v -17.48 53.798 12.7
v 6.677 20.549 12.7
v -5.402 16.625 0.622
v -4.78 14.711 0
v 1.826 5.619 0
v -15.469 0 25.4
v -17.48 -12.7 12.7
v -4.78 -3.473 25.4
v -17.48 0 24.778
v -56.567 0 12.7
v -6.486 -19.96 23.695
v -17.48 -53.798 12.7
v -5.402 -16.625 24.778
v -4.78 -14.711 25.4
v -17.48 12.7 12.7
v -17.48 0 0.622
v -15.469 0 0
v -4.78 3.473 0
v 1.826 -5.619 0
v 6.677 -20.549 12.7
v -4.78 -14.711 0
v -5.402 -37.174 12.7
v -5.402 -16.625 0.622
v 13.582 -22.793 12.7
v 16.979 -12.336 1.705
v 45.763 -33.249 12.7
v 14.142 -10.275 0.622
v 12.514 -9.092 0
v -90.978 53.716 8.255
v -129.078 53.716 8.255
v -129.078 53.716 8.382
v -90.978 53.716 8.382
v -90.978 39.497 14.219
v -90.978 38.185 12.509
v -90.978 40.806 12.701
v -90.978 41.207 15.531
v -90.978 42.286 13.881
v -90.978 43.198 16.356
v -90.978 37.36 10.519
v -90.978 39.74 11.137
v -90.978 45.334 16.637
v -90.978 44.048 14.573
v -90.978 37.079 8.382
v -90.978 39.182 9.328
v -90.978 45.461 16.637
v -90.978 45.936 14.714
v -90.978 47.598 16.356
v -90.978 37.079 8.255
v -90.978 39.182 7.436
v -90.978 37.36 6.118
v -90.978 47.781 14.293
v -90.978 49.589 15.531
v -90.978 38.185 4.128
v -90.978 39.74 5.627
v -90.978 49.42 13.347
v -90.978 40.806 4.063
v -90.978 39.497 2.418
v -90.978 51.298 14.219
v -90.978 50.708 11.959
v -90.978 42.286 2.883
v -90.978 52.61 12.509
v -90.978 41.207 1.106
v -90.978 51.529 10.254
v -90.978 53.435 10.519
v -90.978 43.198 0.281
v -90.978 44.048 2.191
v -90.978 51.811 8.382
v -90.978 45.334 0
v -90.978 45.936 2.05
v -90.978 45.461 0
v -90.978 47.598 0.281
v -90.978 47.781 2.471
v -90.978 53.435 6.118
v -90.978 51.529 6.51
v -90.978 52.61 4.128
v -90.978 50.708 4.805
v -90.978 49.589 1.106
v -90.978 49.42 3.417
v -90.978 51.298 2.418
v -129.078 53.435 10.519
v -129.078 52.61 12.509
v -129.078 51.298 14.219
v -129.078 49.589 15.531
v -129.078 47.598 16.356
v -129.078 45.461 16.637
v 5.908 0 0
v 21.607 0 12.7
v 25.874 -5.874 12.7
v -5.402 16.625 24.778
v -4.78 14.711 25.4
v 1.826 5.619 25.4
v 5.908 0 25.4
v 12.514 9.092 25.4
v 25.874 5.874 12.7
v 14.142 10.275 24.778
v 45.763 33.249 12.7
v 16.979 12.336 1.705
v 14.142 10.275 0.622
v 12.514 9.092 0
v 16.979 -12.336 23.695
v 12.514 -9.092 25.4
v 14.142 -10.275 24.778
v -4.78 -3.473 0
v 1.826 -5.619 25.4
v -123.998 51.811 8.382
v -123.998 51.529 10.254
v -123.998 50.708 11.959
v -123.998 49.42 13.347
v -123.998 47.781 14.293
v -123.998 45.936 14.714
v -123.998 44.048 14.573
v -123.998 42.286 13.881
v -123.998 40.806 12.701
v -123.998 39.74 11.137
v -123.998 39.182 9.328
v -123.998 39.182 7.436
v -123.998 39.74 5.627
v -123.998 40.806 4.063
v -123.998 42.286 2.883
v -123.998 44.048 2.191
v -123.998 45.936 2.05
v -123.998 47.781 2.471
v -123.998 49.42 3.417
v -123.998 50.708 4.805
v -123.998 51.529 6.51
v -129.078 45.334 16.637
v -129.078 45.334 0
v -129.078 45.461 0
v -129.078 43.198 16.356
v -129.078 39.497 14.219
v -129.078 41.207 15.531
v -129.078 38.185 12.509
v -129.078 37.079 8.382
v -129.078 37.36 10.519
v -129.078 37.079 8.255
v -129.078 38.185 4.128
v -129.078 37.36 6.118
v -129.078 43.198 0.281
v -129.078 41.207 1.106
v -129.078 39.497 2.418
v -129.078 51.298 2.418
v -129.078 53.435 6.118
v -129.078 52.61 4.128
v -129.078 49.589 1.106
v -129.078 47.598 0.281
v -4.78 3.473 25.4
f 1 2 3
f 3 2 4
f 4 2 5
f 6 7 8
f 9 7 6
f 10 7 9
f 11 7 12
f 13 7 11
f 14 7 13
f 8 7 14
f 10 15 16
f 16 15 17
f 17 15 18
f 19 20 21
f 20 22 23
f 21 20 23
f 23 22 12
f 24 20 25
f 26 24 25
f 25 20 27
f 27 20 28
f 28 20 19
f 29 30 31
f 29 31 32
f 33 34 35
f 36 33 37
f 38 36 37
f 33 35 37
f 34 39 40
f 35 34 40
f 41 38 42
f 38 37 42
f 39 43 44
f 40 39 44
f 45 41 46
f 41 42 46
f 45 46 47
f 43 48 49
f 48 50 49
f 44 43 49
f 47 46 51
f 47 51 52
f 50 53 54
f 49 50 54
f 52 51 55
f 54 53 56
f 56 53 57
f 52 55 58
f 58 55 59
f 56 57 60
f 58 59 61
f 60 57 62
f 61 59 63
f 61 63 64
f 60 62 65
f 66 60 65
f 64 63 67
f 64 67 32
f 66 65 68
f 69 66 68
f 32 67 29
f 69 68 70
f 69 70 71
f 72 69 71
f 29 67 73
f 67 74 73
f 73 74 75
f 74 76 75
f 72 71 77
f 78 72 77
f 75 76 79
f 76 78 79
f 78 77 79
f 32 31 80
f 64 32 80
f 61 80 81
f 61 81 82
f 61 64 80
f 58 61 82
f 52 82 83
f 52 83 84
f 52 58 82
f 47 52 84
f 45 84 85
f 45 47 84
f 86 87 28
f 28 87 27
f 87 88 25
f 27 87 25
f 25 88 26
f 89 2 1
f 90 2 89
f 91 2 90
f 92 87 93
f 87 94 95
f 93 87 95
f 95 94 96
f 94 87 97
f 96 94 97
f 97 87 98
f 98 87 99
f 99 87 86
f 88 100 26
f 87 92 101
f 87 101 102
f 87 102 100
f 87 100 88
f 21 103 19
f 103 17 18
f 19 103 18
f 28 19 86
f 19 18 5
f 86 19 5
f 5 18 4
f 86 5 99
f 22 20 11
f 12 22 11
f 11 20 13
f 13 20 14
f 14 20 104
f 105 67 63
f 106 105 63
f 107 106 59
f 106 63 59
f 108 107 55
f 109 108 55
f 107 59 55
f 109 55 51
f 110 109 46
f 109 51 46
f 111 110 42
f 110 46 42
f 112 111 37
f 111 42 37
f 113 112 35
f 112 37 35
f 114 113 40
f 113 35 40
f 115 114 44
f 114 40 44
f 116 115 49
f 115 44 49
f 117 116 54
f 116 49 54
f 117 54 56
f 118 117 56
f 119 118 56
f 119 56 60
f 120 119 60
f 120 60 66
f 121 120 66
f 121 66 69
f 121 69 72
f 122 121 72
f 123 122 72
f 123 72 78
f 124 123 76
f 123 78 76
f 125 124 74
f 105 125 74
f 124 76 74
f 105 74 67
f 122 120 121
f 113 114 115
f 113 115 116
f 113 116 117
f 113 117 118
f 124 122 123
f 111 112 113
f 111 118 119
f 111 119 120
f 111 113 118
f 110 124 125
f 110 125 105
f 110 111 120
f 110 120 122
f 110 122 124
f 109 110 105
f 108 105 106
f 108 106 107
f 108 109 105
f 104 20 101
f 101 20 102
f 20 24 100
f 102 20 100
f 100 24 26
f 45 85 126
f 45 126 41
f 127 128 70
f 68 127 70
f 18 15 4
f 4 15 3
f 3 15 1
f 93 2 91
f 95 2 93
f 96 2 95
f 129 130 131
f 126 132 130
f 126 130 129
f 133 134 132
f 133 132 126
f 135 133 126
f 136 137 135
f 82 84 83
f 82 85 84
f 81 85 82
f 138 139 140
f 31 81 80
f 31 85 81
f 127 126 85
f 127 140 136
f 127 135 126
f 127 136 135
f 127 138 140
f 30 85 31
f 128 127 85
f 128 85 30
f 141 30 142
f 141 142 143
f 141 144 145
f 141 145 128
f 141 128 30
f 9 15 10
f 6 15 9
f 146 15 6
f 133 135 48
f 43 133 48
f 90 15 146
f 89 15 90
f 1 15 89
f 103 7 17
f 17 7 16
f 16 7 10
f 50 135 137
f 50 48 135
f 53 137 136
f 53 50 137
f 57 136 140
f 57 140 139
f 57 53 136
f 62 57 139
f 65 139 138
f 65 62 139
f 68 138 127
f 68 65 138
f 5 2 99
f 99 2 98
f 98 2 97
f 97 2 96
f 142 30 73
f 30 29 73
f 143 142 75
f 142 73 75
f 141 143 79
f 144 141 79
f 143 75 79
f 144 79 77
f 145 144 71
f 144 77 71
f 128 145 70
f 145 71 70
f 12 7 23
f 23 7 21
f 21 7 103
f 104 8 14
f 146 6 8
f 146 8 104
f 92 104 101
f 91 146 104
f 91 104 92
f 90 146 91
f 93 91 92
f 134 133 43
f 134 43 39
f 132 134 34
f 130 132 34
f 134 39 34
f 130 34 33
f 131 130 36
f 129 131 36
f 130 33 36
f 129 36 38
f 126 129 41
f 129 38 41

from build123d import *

# Parameters (mm, degrees)
F1_DEPTH      = 25.4
F2_T4_DEPTH   = 106.4188112086
F2_T9_DEPTH   = 106.4188112086
F2_T14_DEPTH  = 106.4188112086
F2_T19_DEPTH  = 106.4188112086
F2_T24_DEPTH  = 106.4188112086
F2_T29_DEPTH  = 106.4188112086
F2_T34_DEPTH  = 106.4188112086
F2_T39_DEPTH  = 106.4188112086
F2_T44_DEPTH  = 106.4188112086
F2_T49_DEPTH  = 106.4188112086
F2_T54_DEPTH  = 106.4188112086
F2_T59_DEPTH  = 106.4188112086
F2_T64_DEPTH  = 106.4188112086
F2_T69_DEPTH  = 106.4188112086
F2_T74_DEPTH  = 106.4188112086
F2_T79_DEPTH  = 106.4188112086
F2_T84_DEPTH  = 106.4188112086
F2_T89_DEPTH  = 106.4188112086
F2_T94_DEPTH  = 106.4188112086
F2_T99_DEPTH  = 106.4188112086
F2_T104_DEPTH = 106.4188112086
F2_T109_DEPTH = 106.4188112086
F2_T114_DEPTH = 106.4188112086
F2_T119_DEPTH = 106.4188112086
F2_T124_DEPTH = 106.4188112086
F2_T129_DEPTH = 106.4188112086
F2_T134_DEPTH = 106.4188112086
F2_T139_DEPTH = 106.4188112086
F2_T144_DEPTH = 106.4188112086
F2_T149_DEPTH = 106.4188112086
F2_T154_DEPTH = 106.4188112086
F2_T159_DEPTH = 106.4188112086
F2_T164_DEPTH = 106.4188112086
F2_T169_DEPTH = 106.4188112086
F2_T174_DEPTH = 106.4188112086
F2_T179_DEPTH = 106.4188112086
F2_T184_DEPTH = 106.4188112086
F2_T189_DEPTH = 106.4188112086
F2_T194_DEPTH = 106.4188112086
F2_T199_DEPTH = 106.4188112086
F2_T205_DEPTH = 106.4188112086
F2_T210_DEPTH = 106.4188112086
F2_T218_DEPTH = 106.4188112086
F2_T223_DEPTH = 106.4188112086
F2_T231_DEPTH = 106.4188112086
F2_T236_DEPTH = 106.4188112086
F2_T244_DEPTH = 106.4188112086
F2_T249_DEPTH = 106.4188112086
F2_T257_DEPTH = 106.4188112086
F2_T262_DEPTH = 106.4188112086
F2_T270_DEPTH = 106.4188112086
F2_T275_DEPTH = 106.4188112086
F2_T283_DEPTH = 106.4188112086
F2_T288_DEPTH = 106.4188112086
F2_T296_DEPTH = 106.4188112086
F2_T301_DEPTH = 106.4188112086
F2_T309_DEPTH = 106.4188112086
F2_T314_DEPTH = 106.4188112086
F2_T322_DEPTH = 106.4188112086
F2_T327_DEPTH = 106.4188112086
F3_W          = 38.1
F3_H          = 16.637
F4_DEPTH      = 16.637
F5_R          = 8.255
F6_R          = 6.35
F7_DEPTH      = 33.02


# Not quite as in the source:
# - a fillet or chamfer that OpenCascade refuses, or shapes differently, is made with other operations: its cross-section is extruded or revolved along the edge and cut away or added


with BuildPart() as f1:
    # F0 (on Top) → F1 (new body)
    with BuildSketch(Plane.XY):
        Polygon((45.763366046, 33.2490316571), (6.6767851239, 20.5490316571), (-17.48005039, 53.7980633142), (-17.48005039, 12.7), (-56.5666313121, 0), (-17.48005039, -12.7), (-17.48005039, -53.7980633142), (-5.401632633, -37.1735474857), (6.6767851239, -20.5490316571), (26.220075585, -26.8990316571), (45.763366046, -33.2490316571), (33.6849482891, -16.6245158286), (27.6457394106, -8.3122579143), (21.6065305321, 0), (27.6457394106, 8.3122579143), (33.6849482891, 16.6245158286), align=None)
    extrude(amount=F1_DEPTH)

    # F2: chamfer of 12.7 on 20 edges, made by hand


with BuildPart() as f2_tool2:
    # F2_s3 → F2_t4 (new body)
    with BuildSketch(Plane(origin=(82.2268601462, 26.7171264209, 0), x_dir=(0, 0, 1), z_dir=(-0.9510565163, -0.3090169944, 0))):
        Polygon((12.7, 17.48005039), (0, 4.78005039), (0, 17.48005039), align=None)
    extrude(amount=F2_T4_DEPTH)

    split(bisect_by=Plane(origin=(14.141657828, 10.2745158286, 0), x_dir=(0, 0, 1), z_dir=(0.8090169944, 0.5877852523, 0)), keep=Keep.TOP)


with BuildPart() as f1_1:
    add(f1.part)

    # F2_t1: cut F2_tool2
    add(f2_tool2.part, mode=Mode.SUBTRACT)


with BuildPart() as f2_tool7:
    # F2_s8 → F2_t9 (new body)
    with BuildSketch(Plane(origin=(82.2268601462, 26.7171264209, 0), x_dir=(0, 0, 1), z_dir=(-0.9510565163, -0.3090169944, 0))):
        Polygon((12.7, 17.48005039), (0, 4.78005039), (0, 17.48005039), align=None)
    extrude(amount=F2_T9_DEPTH)

    split(bisect_by=Plane.YZ.offset(-17.48005039), keep=Keep.BOTTOM)


with BuildPart() as f1_2:
    add(f1_1.part)

    # F2_t6: cut F2_tool7
    add(f2_tool7.part, mode=Mode.SUBTRACT)


with BuildPart() as f2_tool12:
    # F2_s13 → F2_t14 (new body)
    with BuildSketch(Plane(origin=(11.7324134364, -16.1482817373, 0), x_dir=(0, 0, 1), z_dir=(-0.5877852523, 0.8090169944, 0))):
        Polygon((12.7, 17.48005039), (0, 4.78005039), (0, 17.48005039), align=None)
    extrude(amount=F2_T14_DEPTH)

    split(bisect_by=Plane(origin=(14.141657828, -10.2745158286, 0), x_dir=(0, 0, 1), z_dir=(0.8090169944, -0.5877852523, 0)), keep=Keep.TOP)


with BuildPart() as f1_3:
    add(f1_2.part)

    # F2_t11: cut F2_tool12
    add(f2_tool12.part, mode=Mode.SUBTRACT)


with BuildPart() as f2_tool17:
    # F2_s18 → F2_t19 (new body)
    with BuildSketch(Plane(origin=(11.7324134364, -16.1482817373, 0), x_dir=(0, 0, 1), z_dir=(-0.5877852523, 0.8090169944, 0))):
        Polygon((12.7, 17.48005039), (0, 4.78005039), (0, 17.48005039), align=None)
    extrude(amount=F2_T19_DEPTH)

    split(bisect_by=Plane(origin=(-5.401632633, 16.6245158286, 0), x_dir=(0, 0, 1), z_dir=(-0.3090169944, 0.9510565163, 0)), keep=Keep.TOP)


with BuildPart() as f1_4:
    add(f1_3.part)

    # F2_t16: cut F2_tool17
    add(f2_tool17.part, mode=Mode.SUBTRACT)


with BuildPart() as f2_tool22:
    # F2_s23 → F2_t24 (new body)
    with BuildSketch(Plane.XZ.offset(-86.4584372614)):
        Polygon((-17.48005039, 12.7), (-4.78005039, 0), (-17.48005039, 0), align=None)
    extrude(amount=F2_T24_DEPTH)

    split(bisect_by=Plane(origin=(-5.401632633, 16.6245158286, 0), x_dir=(0, 0, 1), z_dir=(-0.3090169944, 0.9510565163, 0)), keep=Keep.TOP)


with BuildPart() as f1_5:
    add(f1_4.part)

    # F2_t21: cut F2_tool22
    add(f2_tool22.part, mode=Mode.SUBTRACT)


with BuildPart() as f2_tool27:
    # F2_s28 → F2_t29 (new body)
    with BuildSketch(Plane.XZ.offset(-86.4584372614)):
        Polygon((-17.48005039, 12.7), (-4.78005039, 0), (-17.48005039, 0), align=None)
    extrude(amount=F2_T29_DEPTH)

    split(bisect_by=Plane(origin=(-5.401632633, -16.6245158286, 0), x_dir=(0, 0, 1), z_dir=(-0.3090169944, -0.9510565163, 0)), keep=Keep.TOP)


with BuildPart() as f1_6:
    add(f1_5.part)

    # F2_t26: cut F2_tool27
    add(f2_tool27.part, mode=Mode.SUBTRACT)


with BuildPart() as f2_tool32:
    # F2_s33 → F2_t34 (new body)
    with BuildSketch(Plane(origin=(18.9834437101, 6.1680947638, 0), x_dir=(0, 0, 1), z_dir=(-0.9510565163, -0.3090169944, 0))):
        Polygon((12.7, 17.48005039), (0, 4.78005039), (0, 17.48005039), align=None)
    extrude(amount=F2_T34_DEPTH)

    split(bisect_by=Plane(origin=(14.141657828, 10.2745158286, 0), x_dir=(0, 0, 1), z_dir=(0.8090169944, 0.5877852523, 0)), keep=Keep.TOP)


with BuildPart() as f1_7:
    add(f1_6.part)

    # F2_t31: cut F2_tool32
    add(f2_tool32.part, mode=Mode.SUBTRACT)


with BuildPart() as f2_tool37:
    # F2_s38 → F2_t39 (new body)
    with BuildSketch(Plane(origin=(18.9834437101, 6.1680947638, 0), x_dir=(0, 0, 1), z_dir=(-0.9510565163, -0.3090169944, 0))):
        Polygon((12.7, 17.48005039), (0, 4.78005039), (0, 17.48005039), align=None)
    extrude(amount=F2_T39_DEPTH)

    split(bisect_by=Plane.YZ.offset(-17.48005039), keep=Keep.BOTTOM)


with BuildPart() as f1_8:
    add(f1_7.part)

    # F2_t36: cut F2_tool37
    add(f2_tool37.part, mode=Mode.SUBTRACT)


with BuildPart() as f2_tool42:
    # F2_s43 → F2_t44 (new body)
    with BuildSketch(Plane(origin=(-82.2268601462, 26.7171264209, 0), x_dir=(0, 0, 1), z_dir=(0.9510565163, -0.3090169944, 0))):
        Polygon((12.7, 17.48005039), (0, 4.78005039), (0, 17.48005039), align=None)
    extrude(amount=F2_T44_DEPTH)

    split(bisect_by=Plane.YZ.offset(-17.48005039), keep=Keep.BOTTOM)


with BuildPart() as f1_9:
    add(f1_8.part)

    # F2_t41: cut F2_tool42
    add(f2_tool42.part, mode=Mode.SUBTRACT)


with BuildPart() as f2_tool47:
    # F2_s48 → F2_t49 (new body)
    with BuildSketch(Plane(origin=(-82.2268601462, 26.7171264209, 0), x_dir=(0, 0, 1), z_dir=(0.9510565163, -0.3090169944, 0))):
        Polygon((12.7, 17.48005039), (0, 4.78005039), (0, 17.48005039), align=None)
    extrude(amount=F2_T49_DEPTH)

    split(bisect_by=Plane(origin=(14.141657828, -10.2745158286, 0), x_dir=(0, 0, 1), z_dir=(0.8090169944, -0.5877852523, 0)), keep=Keep.TOP)


with BuildPart() as f1_10:
    add(f1_9.part)

    # F2_t46: cut F2_tool47
    add(f2_tool47.part, mode=Mode.SUBTRACT)


with BuildPart() as f2_tool52:
    # F2_s53 → F2_t54 (new body)
    with BuildSketch(Plane.XZ.offset(-19.9603739472)):
        Polygon((-17.48005039, 12.7), (-4.78005039, 0), (-17.48005039, 0), align=None)
    extrude(amount=F2_T54_DEPTH)

    split(bisect_by=Plane(origin=(-5.401632633, 16.6245158286, 0), x_dir=(0, 0, 1), z_dir=(-0.3090169944, 0.9510565163, 0)), keep=Keep.TOP)


with BuildPart() as f1_11:
    add(f1_10.part)

    # F2_t51: cut F2_tool52
    add(f2_tool52.part, mode=Mode.SUBTRACT)


with BuildPart() as f2_tool57:
    # F2_s58 → F2_t59 (new body)
    with BuildSketch(Plane.XZ.offset(-19.9603739472)):
        Polygon((-17.48005039, 12.7), (-4.78005039, 0), (-17.48005039, 0), align=None)
    extrude(amount=F2_T59_DEPTH)

    split(bisect_by=Plane(origin=(-5.401632633, -16.6245158286, 0), x_dir=(0, 0, 1), z_dir=(-0.3090169944, -0.9510565163, 0)), keep=Keep.TOP)


with BuildPart() as f1_12:
    add(f1_11.part)

    # F2_t56: cut F2_tool57
    add(f2_tool57.part, mode=Mode.SUBTRACT)


with BuildPart() as f2_tool62:
    # F2_s63 → F2_t64 (new body)
    with BuildSketch(Plane(origin=(-50.8189943585, -69.9463450516, 0), x_dir=(0, 0, 1), z_dir=(0.5877852523, 0.8090169944, 0))):
        Polygon((12.7, 17.48005039), (0, 4.78005039), (0, 17.48005039), align=None)
    extrude(amount=F2_T64_DEPTH)

    split(bisect_by=Plane(origin=(-5.401632633, -16.6245158286, 0), x_dir=(0, 0, 1), z_dir=(-0.3090169944, -0.9510565163, 0)), keep=Keep.TOP)


with BuildPart() as f1_13:
    add(f1_12.part)

    # F2_t61: cut F2_tool62
    add(f2_tool62.part, mode=Mode.SUBTRACT)


with BuildPart() as f2_tool67:
    # F2_s68 → F2_t69 (new body)
    with BuildSketch(Plane(origin=(-50.8189943585, -69.9463450516, 0), x_dir=(0, 0, 1), z_dir=(0.5877852523, 0.8090169944, 0))):
        Polygon((12.7, 17.48005039), (0, 4.78005039), (0, 17.48005039), align=None)
    extrude(amount=F2_T69_DEPTH)

    split(bisect_by=Plane(origin=(14.141657828, 10.2745158286, 0), x_dir=(0, 0, 1), z_dir=(0.8090169944, 0.5877852523, 0)), keep=Keep.TOP)


with BuildPart() as f1_14:
    add(f1_13.part)

    # F2_t66: cut F2_tool67
    add(f2_tool67.part, mode=Mode.SUBTRACT)


with BuildPart() as f2_tool72:
    # F2_s73 → F2_t74 (new body)
    with BuildSketch(Plane(origin=(-18.9834437101, 6.1680947638, 0), x_dir=(0, 0, 1), z_dir=(0.9510565163, -0.3090169944, 0))):
        Polygon((12.7, 17.48005039), (0, 4.78005039), (0, 17.48005039), align=None)
    extrude(amount=F2_T74_DEPTH)

    split(bisect_by=Plane.YZ.offset(-17.48005039), keep=Keep.BOTTOM)


with BuildPart() as f1_15:
    add(f1_14.part)

    # F2_t71: cut F2_tool72
    add(f2_tool72.part, mode=Mode.SUBTRACT)


with BuildPart() as f2_tool77:
    # F2_s78 → F2_t79 (new body)
    with BuildSketch(Plane(origin=(-18.9834437101, 6.1680947638, 0), x_dir=(0, 0, 1), z_dir=(0.9510565163, -0.3090169944, 0))):
        Polygon((12.7, 17.48005039), (0, 4.78005039), (0, 17.48005039), align=None)
    extrude(amount=F2_T79_DEPTH)

    split(bisect_by=Plane(origin=(14.141657828, -10.2745158286, 0), x_dir=(0, 0, 1), z_dir=(0.8090169944, -0.5877852523, 0)), keep=Keep.TOP)


with BuildPart() as f1_16:
    add(f1_15.part)

    # F2_t76: cut F2_tool77
    add(f2_tool77.part, mode=Mode.SUBTRACT)


with BuildPart() as f2_tool82:
    # F2_s83 → F2_t84 (new body)
    with BuildSketch(Plane(origin=(50.8189943585, -69.9463450516, 0), x_dir=(0, 0, 1), z_dir=(-0.5877852523, 0.8090169944, 0))):
        Polygon((12.7, 17.48005039), (0, 4.78005039), (0, 17.48005039), align=None)
    extrude(amount=F2_T84_DEPTH)

    split(bisect_by=Plane(origin=(14.141657828, -10.2745158286, 0), x_dir=(0, 0, 1), z_dir=(0.8090169944, -0.5877852523, 0)), keep=Keep.TOP)


with BuildPart() as f1_17:
    add(f1_16.part)

    # F2_t81: cut F2_tool82
    add(f2_tool82.part, mode=Mode.SUBTRACT)


with BuildPart() as f2_tool87:
    # F2_s88 → F2_t89 (new body)
    with BuildSketch(Plane(origin=(50.8189943585, -69.9463450516, 0), x_dir=(0, 0, 1), z_dir=(-0.5877852523, 0.8090169944, 0))):
        Polygon((12.7, 17.48005039), (0, 4.78005039), (0, 17.48005039), align=None)
    extrude(amount=F2_T89_DEPTH)

    split(bisect_by=Plane(origin=(-5.401632633, 16.6245158286, 0), x_dir=(0, 0, 1), z_dir=(-0.3090169944, 0.9510565163, 0)), keep=Keep.TOP)


with BuildPart() as f1_18:
    add(f1_17.part)

    # F2_t86: cut F2_tool87
    add(f2_tool87.part, mode=Mode.SUBTRACT)


with BuildPart() as f2_tool92:
    # F2_s93 → F2_t94 (new body)
    with BuildSketch(Plane(origin=(-11.7324134364, -16.1482817373, 0), x_dir=(0, 0, 1), z_dir=(0.5877852523, 0.8090169944, 0))):
        Polygon((12.7, 17.48005039), (0, 4.78005039), (0, 17.48005039), align=None)
    extrude(amount=F2_T94_DEPTH)

    split(bisect_by=Plane(origin=(-5.401632633, -16.6245158286, 0), x_dir=(0, 0, 1), z_dir=(-0.3090169944, -0.9510565163, 0)), keep=Keep.TOP)


with BuildPart() as f1_19:
    add(f1_18.part)

    # F2_t91: cut F2_tool92
    add(f2_tool92.part, mode=Mode.SUBTRACT)


with BuildPart() as f2_tool97:
    # F2_s98 → F2_t99 (new body)
    with BuildSketch(Plane(origin=(-11.7324134364, -16.1482817373, 0), x_dir=(0, 0, 1), z_dir=(0.5877852523, 0.8090169944, 0))):
        Polygon((12.7, 17.48005039), (0, 4.78005039), (0, 17.48005039), align=None)
    extrude(amount=F2_T99_DEPTH)

    split(bisect_by=Plane(origin=(14.141657828, 10.2745158286, 0), x_dir=(0, 0, 1), z_dir=(0.8090169944, 0.5877852523, 0)), keep=Keep.TOP)


with BuildPart() as f1_20:
    add(f1_19.part)

    # F2_t96: cut F2_tool97
    add(f2_tool97.part, mode=Mode.SUBTRACT)


with BuildPart() as f2_tool102:
    # F2_s103 → F2_t104 (new body)
    with BuildSketch(Plane(origin=(50.8189943585, 69.9463450516, 0), x_dir=(0, 0, 1), z_dir=(-0.5877852523, -0.8090169944, 0))):
        Polygon((12.7, -17.48005039), (25.4, -4.78005039), (25.4, -17.48005039), align=None)
    extrude(amount=F2_T104_DEPTH)

    split(bisect_by=Plane(origin=(14.141657828, 10.2745158286, 0), x_dir=(0, 0, 1), z_dir=(0.8090169944, 0.5877852523, 0)), keep=Keep.TOP)


with BuildPart() as f1_21:
    add(f1_20.part)

    # F2_t101: cut F2_tool102
    add(f2_tool102.part, mode=Mode.SUBTRACT)


with BuildPart() as f2_tool107:
    # F2_s108 → F2_t109 (new body)
    with BuildSketch(Plane(origin=(50.8189943585, 69.9463450516, 0), x_dir=(0, 0, 1), z_dir=(-0.5877852523, -0.8090169944, 0))):
        Polygon((12.7, -17.48005039), (25.4, -4.78005039), (25.4, -17.48005039), align=None)
    extrude(amount=F2_T109_DEPTH)

    split(bisect_by=Plane(origin=(-5.401632633, -16.6245158286, 0), x_dir=(0, 0, 1), z_dir=(-0.3090169944, -0.9510565163, 0)), keep=Keep.TOP)


with BuildPart() as f1_22:
    add(f1_21.part)

    # F2_t106: cut F2_tool107
    add(f2_tool107.part, mode=Mode.SUBTRACT)


with BuildPart() as f2_tool112:
    # F2_s113 → F2_t114 (new body)
    with BuildSketch(Plane(origin=(82.2268601462, 26.7171264209, 0), x_dir=(0, 0, 1), z_dir=(-0.9510565163, -0.3090169944, 0))):
        Polygon((12.7, 17.48005039), (25.4, 4.78005039), (25.4, 17.48005039), align=None)
    extrude(amount=F2_T114_DEPTH)

    split(bisect_by=Plane(origin=(14.141657828, 10.2745158286, 0), x_dir=(0, 0, 1), z_dir=(0.8090169944, 0.5877852523, 0)), keep=Keep.TOP)


with BuildPart() as f1_23:
    add(f1_22.part)

    # F2_t111: cut F2_tool112
    add(f2_tool112.part, mode=Mode.SUBTRACT)


with BuildPart() as f2_tool117:
    # F2_s118 → F2_t119 (new body)
    with BuildSketch(Plane(origin=(82.2268601462, 26.7171264209, 0), x_dir=(0, 0, 1), z_dir=(-0.9510565163, -0.3090169944, 0))):
        Polygon((12.7, 17.48005039), (25.4, 4.78005039), (25.4, 17.48005039), align=None)
    extrude(amount=F2_T119_DEPTH)

    split(bisect_by=Plane.YZ.offset(-17.48005039), keep=Keep.BOTTOM)


with BuildPart() as f1_24:
    add(f1_23.part)

    # F2_t116: cut F2_tool117
    add(f2_tool117.part, mode=Mode.SUBTRACT)


with BuildPart() as f2_tool122:
    # F2_s123 → F2_t124 (new body)
    with BuildSketch(Plane(origin=(11.7324134364, -16.1482817373, 0), x_dir=(0, 0, 1), z_dir=(-0.5877852523, 0.8090169944, 0))):
        Polygon((12.7, 17.48005039), (25.4, 4.78005039), (25.4, 17.48005039), align=None)
    extrude(amount=F2_T124_DEPTH)

    split(bisect_by=Plane(origin=(14.141657828, -10.2745158286, 0), x_dir=(0, 0, 1), z_dir=(0.8090169944, -0.5877852523, 0)), keep=Keep.TOP)


with BuildPart() as f1_25:
    add(f1_24.part)

    # F2_t121: cut F2_tool122
    add(f2_tool122.part, mode=Mode.SUBTRACT)


with BuildPart() as f2_tool127:
    # F2_s128 → F2_t129 (new body)
    with BuildSketch(Plane(origin=(11.7324134364, -16.1482817373, 0), x_dir=(0, 0, 1), z_dir=(-0.5877852523, 0.8090169944, 0))):
        Polygon((12.7, 17.48005039), (25.4, 4.78005039), (25.4, 17.48005039), align=None)
    extrude(amount=F2_T129_DEPTH)

    split(bisect_by=Plane(origin=(-5.401632633, 16.6245158286, 0), x_dir=(0, 0, 1), z_dir=(-0.3090169944, 0.9510565163, 0)), keep=Keep.TOP)


with BuildPart() as f1_26:
    add(f1_25.part)

    # F2_t126: cut F2_tool127
    add(f2_tool127.part, mode=Mode.SUBTRACT)


with BuildPart() as f2_tool132:
    # F2_s133 → F2_t134 (new body)
    with BuildSketch(Plane.XZ.offset(-86.4584372614)):
        Polygon((-17.48005039, 12.7), (-4.78005039, 25.4), (-17.48005039, 25.4), align=None)
    extrude(amount=F2_T134_DEPTH)

    split(bisect_by=Plane(origin=(-5.401632633, 16.6245158286, 0), x_dir=(0, 0, 1), z_dir=(-0.3090169944, 0.9510565163, 0)), keep=Keep.TOP)


with BuildPart() as f1_27:
    add(f1_26.part)

    # F2_t131: cut F2_tool132
    add(f2_tool132.part, mode=Mode.SUBTRACT)


with BuildPart() as f2_tool137:
    # F2_s138 → F2_t139 (new body)
    with BuildSketch(Plane.XZ.offset(-86.4584372614)):
        Polygon((-17.48005039, 12.7), (-4.78005039, 25.4), (-17.48005039, 25.4), align=None)
    extrude(amount=F2_T139_DEPTH)

    split(bisect_by=Plane(origin=(-5.401632633, -16.6245158286, 0), x_dir=(0, 0, 1), z_dir=(-0.3090169944, -0.9510565163, 0)), keep=Keep.TOP)


with BuildPart() as f1_28:
    add(f1_27.part)

    # F2_t136: cut F2_tool137
    add(f2_tool137.part, mode=Mode.SUBTRACT)


with BuildPart() as f2_tool142:
    # F2_s143 → F2_t144 (new body)
    with BuildSketch(Plane(origin=(18.9834437101, 6.1680947638, 0), x_dir=(0, 0, 1), z_dir=(-0.9510565163, -0.3090169944, 0))):
        Polygon((12.7, 17.48005039), (25.4, 4.78005039), (25.4, 17.48005039), align=None)
    extrude(amount=F2_T144_DEPTH)

    split(bisect_by=Plane(origin=(14.141657828, 10.2745158286, 0), x_dir=(0, 0, 1), z_dir=(0.8090169944, 0.5877852523, 0)), keep=Keep.TOP)


with BuildPart() as f1_29:
    add(f1_28.part)

    # F2_t141: cut F2_tool142
    add(f2_tool142.part, mode=Mode.SUBTRACT)


with BuildPart() as f2_tool147:
    # F2_s148 → F2_t149 (new body)
    with BuildSketch(Plane(origin=(18.9834437101, 6.1680947638, 0), x_dir=(0, 0, 1), z_dir=(-0.9510565163, -0.3090169944, 0))):
        Polygon((12.7, 17.48005039), (25.4, 4.78005039), (25.4, 17.48005039), align=None)
    extrude(amount=F2_T149_DEPTH)

    split(bisect_by=Plane.YZ.offset(-17.48005039), keep=Keep.BOTTOM)


with BuildPart() as f1_30:
    add(f1_29.part)

    # F2_t146: cut F2_tool147
    add(f2_tool147.part, mode=Mode.SUBTRACT)


with BuildPart() as f2_tool152:
    # F2_s153 → F2_t154 (new body)
    with BuildSketch(Plane(origin=(-82.2268601462, 26.7171264209, 0), x_dir=(0, 0, 1), z_dir=(0.9510565163, -0.3090169944, 0))):
        Polygon((12.7, 17.48005039), (25.4, 4.78005039), (25.4, 17.48005039), align=None)
    extrude(amount=F2_T154_DEPTH)

    split(bisect_by=Plane.YZ.offset(-17.48005039), keep=Keep.BOTTOM)


with BuildPart() as f1_31:
    add(f1_30.part)

    # F2_t151: cut F2_tool152
    add(f2_tool152.part, mode=Mode.SUBTRACT)


with BuildPart() as f2_tool157:
    # F2_s158 → F2_t159 (new body)
    with BuildSketch(Plane(origin=(-82.2268601462, 26.7171264209, 0), x_dir=(0, 0, 1), z_dir=(0.9510565163, -0.3090169944, 0))):
        Polygon((12.7, 17.48005039), (25.4, 4.78005039), (25.4, 17.48005039), align=None)
    extrude(amount=F2_T159_DEPTH)

    split(bisect_by=Plane(origin=(14.141657828, -10.2745158286, 0), x_dir=(0, 0, 1), z_dir=(0.8090169944, -0.5877852523, 0)), keep=Keep.TOP)


with BuildPart() as f1_32:
    add(f1_31.part)

    # F2_t156: cut F2_tool157
    add(f2_tool157.part, mode=Mode.SUBTRACT)


with BuildPart() as f2_tool162:
    # F2_s163 → F2_t164 (new body)
    with BuildSketch(Plane.XZ.offset(-19.9603739472)):
        Polygon((-17.48005039, 12.7), (-4.78005039, 25.4), (-17.48005039, 25.4), align=None)
    extrude(amount=F2_T164_DEPTH)

    split(bisect_by=Plane(origin=(-5.401632633, 16.6245158286, 0), x_dir=(0, 0, 1), z_dir=(-0.3090169944, 0.9510565163, 0)), keep=Keep.TOP)


with BuildPart() as f1_33:
    add(f1_32.part)

    # F2_t161: cut F2_tool162
    add(f2_tool162.part, mode=Mode.SUBTRACT)


with BuildPart() as f2_tool167:
    # F2_s168 → F2_t169 (new body)
    with BuildSketch(Plane.XZ.offset(-19.9603739472)):
        Polygon((-17.48005039, 12.7), (-4.78005039, 25.4), (-17.48005039, 25.4), align=None)
    extrude(amount=F2_T169_DEPTH)

    split(bisect_by=Plane(origin=(-5.401632633, -16.6245158286, 0), x_dir=(0, 0, 1), z_dir=(-0.3090169944, -0.9510565163, 0)), keep=Keep.TOP)


with BuildPart() as f1_34:
    add(f1_33.part)

    # F2_t166: cut F2_tool167
    add(f2_tool167.part, mode=Mode.SUBTRACT)


with BuildPart() as f2_tool172:
    # F2_s173 → F2_t174 (new body)
    with BuildSketch(Plane(origin=(11.7324134364, 16.1482817373, 0), x_dir=(0, 0, 1), z_dir=(-0.5877852523, -0.8090169944, 0))):
        Polygon((12.7, -17.48005039), (25.4, -4.78005039), (25.4, -17.48005039), align=None)
    extrude(amount=F2_T174_DEPTH)

    split(bisect_by=Plane(origin=(14.141657828, 10.2745158286, 0), x_dir=(0, 0, 1), z_dir=(0.8090169944, 0.5877852523, 0)), keep=Keep.TOP)


with BuildPart() as f1_35:
    add(f1_34.part)

    # F2_t171: cut F2_tool172
    add(f2_tool172.part, mode=Mode.SUBTRACT)


with BuildPart() as f2_tool177:
    # F2_s178 → F2_t179 (new body)
    with BuildSketch(Plane(origin=(11.7324134364, 16.1482817373, 0), x_dir=(0, 0, 1), z_dir=(-0.5877852523, -0.8090169944, 0))):
        Polygon((12.7, -17.48005039), (25.4, -4.78005039), (25.4, -17.48005039), align=None)
    extrude(amount=F2_T179_DEPTH)

    split(bisect_by=Plane(origin=(-5.401632633, -16.6245158286, 0), x_dir=(0, 0, 1), z_dir=(-0.3090169944, -0.9510565163, 0)), keep=Keep.TOP)


with BuildPart() as f1_36:
    add(f1_35.part)

    # F2_t176: cut F2_tool177
    add(f2_tool177.part, mode=Mode.SUBTRACT)


with BuildPart() as f2_tool182:
    # F2_s183 → F2_t184 (new body)
    with BuildSketch(Plane(origin=(82.2268601462, -26.7171264209, 0), x_dir=(0, 0, 1), z_dir=(-0.9510565163, 0.3090169944, 0))):
        Polygon((12.7, -17.48005039), (25.4, -4.78005039), (25.4, -17.48005039), align=None)
    extrude(amount=F2_T184_DEPTH)

    split(bisect_by=Plane(origin=(14.141657828, -10.2745158286, 0), x_dir=(0, 0, 1), z_dir=(0.8090169944, -0.5877852523, 0)), keep=Keep.TOP)


with BuildPart() as f1_37:
    add(f1_36.part)

    # F2_t181: cut F2_tool182
    add(f2_tool182.part, mode=Mode.SUBTRACT)


with BuildPart() as f2_tool187:
    # F2_s188 → F2_t189 (new body)
    with BuildSketch(Plane(origin=(82.2268601462, -26.7171264209, 0), x_dir=(0, 0, 1), z_dir=(-0.9510565163, 0.3090169944, 0))):
        Polygon((12.7, -17.48005039), (25.4, -4.78005039), (25.4, -17.48005039), align=None)
    extrude(amount=F2_T189_DEPTH)

    split(bisect_by=Plane.YZ.offset(-17.48005039), keep=Keep.BOTTOM)


with BuildPart() as f1_38:
    add(f1_37.part)

    # F2_t186: cut F2_tool187
    add(f2_tool187.part, mode=Mode.SUBTRACT)


with BuildPart() as f2_tool192:
    # F2_s193 → F2_t194 (new body)
    with BuildSketch(Plane(origin=(-11.7324134364, 16.1482817373, 0), x_dir=(0, 0, 1), z_dir=(0.5877852523, -0.8090169944, 0))):
        Polygon((25.4, -4.78005039), (12.7, -17.48005039), (25.4, -17.48005039), align=None)
    extrude(amount=F2_T194_DEPTH)

    split(bisect_by=Plane(origin=(-5.401632633, 16.6245158286, 0), x_dir=(0, 0, 1), z_dir=(-0.3090169944, 0.9510565163, 0)), keep=Keep.TOP)


with BuildPart() as f1_39:
    add(f1_38.part)

    # F2_t191: cut F2_tool192
    add(f2_tool192.part, mode=Mode.SUBTRACT)


with BuildPart() as f2_tool197:
    # F2_s198 → F2_t199 (new body)
    with BuildSketch(Plane(origin=(-11.7324134364, 16.1482817373, 0), x_dir=(0, 0, 1), z_dir=(0.5877852523, -0.8090169944, 0))):
        Polygon((25.4, -4.78005039), (12.7, -17.48005039), (25.4, -17.48005039), align=None)
    extrude(amount=F2_T199_DEPTH)

    split(bisect_by=Plane(origin=(14.141657828, -10.2745158286, 0), x_dir=(0, 0, 1), z_dir=(0.8090169944, -0.5877852523, 0)), keep=Keep.TOP)


with BuildPart() as f1_40:
    add(f1_39.part)

    # F2_t196: cut F2_tool197
    add(f2_tool197.part, mode=Mode.SUBTRACT)


with BuildPart() as f2_tool203:
    # F2_s204 → F2_t205 (new body)
    with BuildSketch(Plane(origin=(82.2268601462, 26.7171264209, 0), x_dir=(0, 0, 1), z_dir=(-0.9510565163, -0.3090169944, 0))):
        Polygon((12.7, 17.48005039), (0, 4.78005039), (0, 17.48005039), align=None)
    extrude(amount=F2_T205_DEPTH)

    split(bisect_by=Plane(origin=(14.141657828, 10.2745158286, 0), x_dir=(0, 0, 1), z_dir=(-0.8090169944, -0.5877852523, 0)), keep=Keep.TOP)

    split(bisect_by=Plane.YZ.offset(-17.48005039), keep=Keep.TOP)


with BuildPart() as f2_tool208:
    # F2_s209 → F2_t210 (new body)
    with BuildSketch(Plane(origin=(11.7324134364, -16.1482817373, 0), x_dir=(0, 0, 1), z_dir=(-0.5877852523, 0.8090169944, 0))):
        Polygon((12.7, 17.48005039), (0, 4.78005039), (0, 17.48005039), align=None)
    extrude(amount=F2_T210_DEPTH)

    split(bisect_by=Plane(origin=(14.141657828, -10.2745158286, 0), x_dir=(0, 0, 1), z_dir=(-0.8090169944, 0.5877852523, 0)), keep=Keep.TOP)

    split(bisect_by=Plane(origin=(-5.401632633, 16.6245158286, 0), x_dir=(0, 0, 1), z_dir=(0.3090169944, -0.9510565163, 0)), keep=Keep.TOP)


with BuildPart() as f2_tool203_1:
    add(f2_tool203.part)

    # F2_t213: intersect F2_tool208
    add(f2_tool208.part, mode=Mode.INTERSECT)


with BuildPart() as f1_41:
    add(f1_40.part)

    # F2_t201: cut F2_tool203
    add(f2_tool203_1.part, mode=Mode.SUBTRACT)


with BuildPart() as f2_tool216:
    # F2_s217 → F2_t218 (new body)
    with BuildSketch(Plane.XZ.offset(-86.4584372614)):
        Polygon((-17.48005039, 12.7), (-4.78005039, 0), (-17.48005039, 0), align=None)
    extrude(amount=F2_T218_DEPTH)

    split(bisect_by=Plane(origin=(-5.401632633, 16.6245158286, 0), x_dir=(0, 0, 1), z_dir=(0.3090169944, -0.9510565163, 0)), keep=Keep.TOP)

    split(bisect_by=Plane(origin=(-5.401632633, -16.6245158286, 0), x_dir=(0, 0, 1), z_dir=(0.3090169944, 0.9510565163, 0)), keep=Keep.TOP)


with BuildPart() as f2_tool221:
    # F2_s222 → F2_t223 (new body)
    with BuildSketch(Plane(origin=(18.9834437101, 6.1680947638, 0), x_dir=(0, 0, 1), z_dir=(-0.9510565163, -0.3090169944, 0))):
        Polygon((12.7, 17.48005039), (0, 4.78005039), (0, 17.48005039), align=None)
    extrude(amount=F2_T223_DEPTH)

    split(bisect_by=Plane(origin=(14.141657828, 10.2745158286, 0), x_dir=(0, 0, 1), z_dir=(-0.8090169944, -0.5877852523, 0)), keep=Keep.TOP)

    split(bisect_by=Plane.YZ.offset(-17.48005039), keep=Keep.TOP)


with BuildPart() as f2_tool216_1:
    add(f2_tool216.part)

    # F2_t226: intersect F2_tool221
    add(f2_tool221.part, mode=Mode.INTERSECT)


with BuildPart() as f1_42:
    add(f1_41.part)

    # F2_t214: cut F2_tool216
    add(f2_tool216_1.part, mode=Mode.SUBTRACT)


with BuildPart() as f2_tool229:
    # F2_s230 → F2_t231 (new body)
    with BuildSketch(Plane(origin=(-82.2268601462, 26.7171264209, 0), x_dir=(0, 0, 1), z_dir=(0.9510565163, -0.3090169944, 0))):
        Polygon((12.7, 17.48005039), (0, 4.78005039), (0, 17.48005039), align=None)
    extrude(amount=F2_T231_DEPTH)

    split(bisect_by=Plane.YZ.offset(-17.48005039), keep=Keep.TOP)

    split(bisect_by=Plane(origin=(14.141657828, -10.2745158286, 0), x_dir=(0, 0, 1), z_dir=(-0.8090169944, 0.5877852523, 0)), keep=Keep.TOP)


with BuildPart() as f2_tool234:
    # F2_s235 → F2_t236 (new body)
    with BuildSketch(Plane.XZ.offset(-19.9603739472)):
        Polygon((-17.48005039, 12.7), (-4.78005039, 0), (-17.48005039, 0), align=None)
    extrude(amount=F2_T236_DEPTH)

    split(bisect_by=Plane(origin=(-5.401632633, 16.6245158286, 0), x_dir=(0, 0, 1), z_dir=(0.3090169944, -0.9510565163, 0)), keep=Keep.TOP)

    split(bisect_by=Plane(origin=(-5.401632633, -16.6245158286, 0), x_dir=(0, 0, 1), z_dir=(0.3090169944, 0.9510565163, 0)), keep=Keep.TOP)


with BuildPart() as f2_tool229_1:
    add(f2_tool229.part)

    # F2_t239: intersect F2_tool234
    add(f2_tool234.part, mode=Mode.INTERSECT)


with BuildPart() as f1_43:
    add(f1_42.part)

    # F2_t227: cut F2_tool229
    add(f2_tool229_1.part, mode=Mode.SUBTRACT)


with BuildPart() as f2_tool242:
    # F2_s243 → F2_t244 (new body)
    with BuildSketch(Plane(origin=(-50.8189943585, -69.9463450516, 0), x_dir=(0, 0, 1), z_dir=(0.5877852523, 0.8090169944, 0))):
        Polygon((12.7, 17.48005039), (0, 4.78005039), (0, 17.48005039), align=None)
    extrude(amount=F2_T244_DEPTH)

    split(bisect_by=Plane(origin=(14.141657828, 10.2745158286, 0), x_dir=(0, 0, 1), z_dir=(-0.8090169944, -0.5877852523, 0)), keep=Keep.TOP)

    split(bisect_by=Plane(origin=(-5.401632633, -16.6245158286, 0), x_dir=(0, 0, 1), z_dir=(0.3090169944, 0.9510565163, 0)), keep=Keep.TOP)


with BuildPart() as f2_tool247:
    # F2_s248 → F2_t249 (new body)
    with BuildSketch(Plane(origin=(-18.9834437101, 6.1680947638, 0), x_dir=(0, 0, 1), z_dir=(0.9510565163, -0.3090169944, 0))):
        Polygon((12.7, 17.48005039), (0, 4.78005039), (0, 17.48005039), align=None)
    extrude(amount=F2_T249_DEPTH)

    split(bisect_by=Plane.YZ.offset(-17.48005039), keep=Keep.TOP)

    split(bisect_by=Plane(origin=(14.141657828, -10.2745158286, 0), x_dir=(0, 0, 1), z_dir=(-0.8090169944, 0.5877852523, 0)), keep=Keep.TOP)


with BuildPart() as f2_tool242_1:
    add(f2_tool242.part)

    # F2_t252: intersect F2_tool247
    add(f2_tool247.part, mode=Mode.INTERSECT)


with BuildPart() as f1_44:
    add(f1_43.part)

    # F2_t240: cut F2_tool242
    add(f2_tool242_1.part, mode=Mode.SUBTRACT)


with BuildPart() as f2_tool255:
    # F2_s256 → F2_t257 (new body)
    with BuildSketch(Plane(origin=(-11.7324134364, -16.1482817373, 0), x_dir=(0, 0, 1), z_dir=(0.5877852523, 0.8090169944, 0))):
        Polygon((12.7, 17.48005039), (0, 4.78005039), (0, 17.48005039), align=None)
    extrude(amount=F2_T257_DEPTH)

    split(bisect_by=Plane(origin=(14.141657828, 10.2745158286, 0), x_dir=(0, 0, 1), z_dir=(-0.8090169944, -0.5877852523, 0)), keep=Keep.TOP)

    split(bisect_by=Plane(origin=(-5.401632633, -16.6245158286, 0), x_dir=(0, 0, 1), z_dir=(0.3090169944, 0.9510565163, 0)), keep=Keep.TOP)


with BuildPart() as f2_tool260:
    # F2_s261 → F2_t262 (new body)
    with BuildSketch(Plane(origin=(50.8189943585, -69.9463450516, 0), x_dir=(0, 0, 1), z_dir=(-0.5877852523, 0.8090169944, 0))):
        Polygon((12.7, 17.48005039), (0, 4.78005039), (0, 17.48005039), align=None)
    extrude(amount=F2_T262_DEPTH)

    split(bisect_by=Plane(origin=(14.141657828, -10.2745158286, 0), x_dir=(0, 0, 1), z_dir=(-0.8090169944, 0.5877852523, 0)), keep=Keep.TOP)

    split(bisect_by=Plane(origin=(-5.401632633, 16.6245158286, 0), x_dir=(0, 0, 1), z_dir=(0.3090169944, -0.9510565163, 0)), keep=Keep.TOP)


with BuildPart() as f2_tool255_1:
    add(f2_tool255.part)

    # F2_t265: intersect F2_tool260
    add(f2_tool260.part, mode=Mode.INTERSECT)


with BuildPart() as f1_45:
    add(f1_44.part)

    # F2_t253: cut F2_tool255
    add(f2_tool255_1.part, mode=Mode.SUBTRACT)


with BuildPart() as f2_tool268:
    # F2_s269 → F2_t270 (new body)
    with BuildSketch(Plane(origin=(50.8189943585, 69.9463450516, 0), x_dir=(0, 0, 1), z_dir=(-0.5877852523, -0.8090169944, 0))):
        Polygon((12.7, -17.48005039), (25.4, -4.78005039), (25.4, -17.48005039), align=None)
    extrude(amount=F2_T270_DEPTH)

    split(bisect_by=Plane(origin=(14.141657828, 10.2745158286, 0), x_dir=(0, 0, 1), z_dir=(-0.8090169944, -0.5877852523, 0)), keep=Keep.TOP)

    split(bisect_by=Plane(origin=(-5.401632633, -16.6245158286, 0), x_dir=(0, 0, 1), z_dir=(0.3090169944, 0.9510565163, 0)), keep=Keep.TOP)


with BuildPart() as f2_tool273:
    # F2_s274 → F2_t275 (new body)
    with BuildSketch(Plane(origin=(-11.7324134364, 16.1482817373, 0), x_dir=(0, 0, 1), z_dir=(0.5877852523, -0.8090169944, 0))):
        Polygon((25.4, -4.78005039), (12.7, -17.48005039), (25.4, -17.48005039), align=None)
    extrude(amount=F2_T275_DEPTH)

    split(bisect_by=Plane(origin=(14.141657828, -10.2745158286, 0), x_dir=(0, 0, 1), z_dir=(-0.8090169944, 0.5877852523, 0)), keep=Keep.TOP)

    split(bisect_by=Plane(origin=(-5.401632633, 16.6245158286, 0), x_dir=(0, 0, 1), z_dir=(0.3090169944, -0.9510565163, 0)), keep=Keep.TOP)


with BuildPart() as f2_tool268_1:
    add(f2_tool268.part)

    # F2_t278: intersect F2_tool273
    add(f2_tool273.part, mode=Mode.INTERSECT)


with BuildPart() as f1_46:
    add(f1_45.part)

    # F2_t266: cut F2_tool268
    add(f2_tool268_1.part, mode=Mode.SUBTRACT)


with BuildPart() as f2_tool281:
    # F2_s282 → F2_t283 (new body)
    with BuildSketch(Plane(origin=(82.2268601462, 26.7171264209, 0), x_dir=(0, 0, 1), z_dir=(-0.9510565163, -0.3090169944, 0))):
        Polygon((12.7, 17.48005039), (25.4, 4.78005039), (25.4, 17.48005039), align=None)
    extrude(amount=F2_T283_DEPTH)

    split(bisect_by=Plane(origin=(14.141657828, 10.2745158286, 0), x_dir=(0, 0, 1), z_dir=(-0.8090169944, -0.5877852523, 0)), keep=Keep.TOP)

    split(bisect_by=Plane.YZ.offset(-17.48005039), keep=Keep.TOP)


with BuildPart() as f2_tool286:
    # F2_s287 → F2_t288 (new body)
    with BuildSketch(Plane(origin=(11.7324134364, -16.1482817373, 0), x_dir=(0, 0, 1), z_dir=(-0.5877852523, 0.8090169944, 0))):
        Polygon((12.7, 17.48005039), (25.4, 4.78005039), (25.4, 17.48005039), align=None)
    extrude(amount=F2_T288_DEPTH)

    split(bisect_by=Plane(origin=(14.141657828, -10.2745158286, 0), x_dir=(0, 0, 1), z_dir=(-0.8090169944, 0.5877852523, 0)), keep=Keep.TOP)

    split(bisect_by=Plane(origin=(-5.401632633, 16.6245158286, 0), x_dir=(0, 0, 1), z_dir=(0.3090169944, -0.9510565163, 0)), keep=Keep.TOP)


with BuildPart() as f2_tool281_1:
    add(f2_tool281.part)

    # F2_t291: intersect F2_tool286
    add(f2_tool286.part, mode=Mode.INTERSECT)


with BuildPart() as f1_47:
    add(f1_46.part)

    # F2_t279: cut F2_tool281
    add(f2_tool281_1.part, mode=Mode.SUBTRACT)


with BuildPart() as f2_tool294:
    # F2_s295 → F2_t296 (new body)
    with BuildSketch(Plane.XZ.offset(-86.4584372614)):
        Polygon((-17.48005039, 12.7), (-4.78005039, 25.4), (-17.48005039, 25.4), align=None)
    extrude(amount=F2_T296_DEPTH)

    split(bisect_by=Plane(origin=(-5.401632633, 16.6245158286, 0), x_dir=(0, 0, 1), z_dir=(0.3090169944, -0.9510565163, 0)), keep=Keep.TOP)

    split(bisect_by=Plane(origin=(-5.401632633, -16.6245158286, 0), x_dir=(0, 0, 1), z_dir=(0.3090169944, 0.9510565163, 0)), keep=Keep.TOP)


with BuildPart() as f2_tool299:
    # F2_s300 → F2_t301 (new body)
    with BuildSketch(Plane(origin=(18.9834437101, 6.1680947638, 0), x_dir=(0, 0, 1), z_dir=(-0.9510565163, -0.3090169944, 0))):
        Polygon((12.7, 17.48005039), (25.4, 4.78005039), (25.4, 17.48005039), align=None)
    extrude(amount=F2_T301_DEPTH)

    split(bisect_by=Plane(origin=(14.141657828, 10.2745158286, 0), x_dir=(0, 0, 1), z_dir=(-0.8090169944, -0.5877852523, 0)), keep=Keep.TOP)

    split(bisect_by=Plane.YZ.offset(-17.48005039), keep=Keep.TOP)


with BuildPart() as f2_tool294_1:
    add(f2_tool294.part)

    # F2_t304: intersect F2_tool299
    add(f2_tool299.part, mode=Mode.INTERSECT)


with BuildPart() as f1_48:
    add(f1_47.part)

    # F2_t292: cut F2_tool294
    add(f2_tool294_1.part, mode=Mode.SUBTRACT)


with BuildPart() as f2_tool307:
    # F2_s308 → F2_t309 (new body)
    with BuildSketch(Plane(origin=(-82.2268601462, 26.7171264209, 0), x_dir=(0, 0, 1), z_dir=(0.9510565163, -0.3090169944, 0))):
        Polygon((12.7, 17.48005039), (25.4, 4.78005039), (25.4, 17.48005039), align=None)
    extrude(amount=F2_T309_DEPTH)

    split(bisect_by=Plane.YZ.offset(-17.48005039), keep=Keep.TOP)

    split(bisect_by=Plane(origin=(14.141657828, -10.2745158286, 0), x_dir=(0, 0, 1), z_dir=(-0.8090169944, 0.5877852523, 0)), keep=Keep.TOP)


with BuildPart() as f2_tool312:
    # F2_s313 → F2_t314 (new body)
    with BuildSketch(Plane.XZ.offset(-19.9603739472)):
        Polygon((-17.48005039, 12.7), (-4.78005039, 25.4), (-17.48005039, 25.4), align=None)
    extrude(amount=F2_T314_DEPTH)

    split(bisect_by=Plane(origin=(-5.401632633, 16.6245158286, 0), x_dir=(0, 0, 1), z_dir=(0.3090169944, -0.9510565163, 0)), keep=Keep.TOP)

    split(bisect_by=Plane(origin=(-5.401632633, -16.6245158286, 0), x_dir=(0, 0, 1), z_dir=(0.3090169944, 0.9510565163, 0)), keep=Keep.TOP)


with BuildPart() as f2_tool307_1:
    add(f2_tool307.part)

    # F2_t317: intersect F2_tool312
    add(f2_tool312.part, mode=Mode.INTERSECT)


with BuildPart() as f1_49:
    add(f1_48.part)

    # F2_t305: cut F2_tool307
    add(f2_tool307_1.part, mode=Mode.SUBTRACT)


with BuildPart() as f2_tool320:
    # F2_s321 → F2_t322 (new body)
    with BuildSketch(Plane(origin=(11.7324134364, 16.1482817373, 0), x_dir=(0, 0, 1), z_dir=(-0.5877852523, -0.8090169944, 0))):
        Polygon((12.7, -17.48005039), (25.4, -4.78005039), (25.4, -17.48005039), align=None)
    extrude(amount=F2_T322_DEPTH)

    split(bisect_by=Plane(origin=(14.141657828, 10.2745158286, 0), x_dir=(0, 0, 1), z_dir=(-0.8090169944, -0.5877852523, 0)), keep=Keep.TOP)

    split(bisect_by=Plane(origin=(-5.401632633, -16.6245158286, 0), x_dir=(0, 0, 1), z_dir=(0.3090169944, 0.9510565163, 0)), keep=Keep.TOP)


with BuildPart() as f2_tool325:
    # F2_s326 → F2_t327 (new body)
    with BuildSketch(Plane(origin=(82.2268601462, -26.7171264209, 0), x_dir=(0, 0, 1), z_dir=(-0.9510565163, 0.3090169944, 0))):
        Polygon((12.7, -17.48005039), (25.4, -4.78005039), (25.4, -17.48005039), align=None)
    extrude(amount=F2_T327_DEPTH)

    split(bisect_by=Plane.YZ.offset(-17.48005039), keep=Keep.TOP)

    split(bisect_by=Plane(origin=(14.141657828, -10.2745158286, 0), x_dir=(0, 0, 1), z_dir=(-0.8090169944, 0.5877852523, 0)), keep=Keep.TOP)


with BuildPart() as f2_tool320_1:
    add(f2_tool320.part)

    # F2_t330: intersect F2_tool325
    add(f2_tool325.part, mode=Mode.INTERSECT)


with BuildPart() as f1_50:
    add(f1_49.part)

    # F2_t318: cut F2_tool320
    add(f2_tool320_1.part, mode=Mode.SUBTRACT)


with BuildPart() as f4:
    # F3 (on Top) → F4 (new body)
    with BuildSketch(Plane.XY):
        with Locations((-110.0284866989, 45.3976067133)):
            Rectangle(F3_W, F3_H)
    extrude(amount=F4_DEPTH)

    # F5
    f5_edges = [f4.edges().sort_by_distance(p)[0] for p in [
        (-110.028487, 53.716107, 16.637),
        (-110.028487, 37.079107, 16.637),
        (-110.028487, 53.716107, 0),
        (-110.028487, 37.079107, 0),
    ]]
    fillet(f5_edges, radius=F5_R)

    # F6 (on face) → F7 (cut)
    with BuildSketch(Plane.YZ.offset(-90.9784866989)):
        with Locations((45.4611067133, 8.382)):
            Circle(F6_R)
    extrude(amount=-F7_DEPTH, mode=Mode.SUBTRACT)


solid = Compound([f1_50.part, f4.part])
